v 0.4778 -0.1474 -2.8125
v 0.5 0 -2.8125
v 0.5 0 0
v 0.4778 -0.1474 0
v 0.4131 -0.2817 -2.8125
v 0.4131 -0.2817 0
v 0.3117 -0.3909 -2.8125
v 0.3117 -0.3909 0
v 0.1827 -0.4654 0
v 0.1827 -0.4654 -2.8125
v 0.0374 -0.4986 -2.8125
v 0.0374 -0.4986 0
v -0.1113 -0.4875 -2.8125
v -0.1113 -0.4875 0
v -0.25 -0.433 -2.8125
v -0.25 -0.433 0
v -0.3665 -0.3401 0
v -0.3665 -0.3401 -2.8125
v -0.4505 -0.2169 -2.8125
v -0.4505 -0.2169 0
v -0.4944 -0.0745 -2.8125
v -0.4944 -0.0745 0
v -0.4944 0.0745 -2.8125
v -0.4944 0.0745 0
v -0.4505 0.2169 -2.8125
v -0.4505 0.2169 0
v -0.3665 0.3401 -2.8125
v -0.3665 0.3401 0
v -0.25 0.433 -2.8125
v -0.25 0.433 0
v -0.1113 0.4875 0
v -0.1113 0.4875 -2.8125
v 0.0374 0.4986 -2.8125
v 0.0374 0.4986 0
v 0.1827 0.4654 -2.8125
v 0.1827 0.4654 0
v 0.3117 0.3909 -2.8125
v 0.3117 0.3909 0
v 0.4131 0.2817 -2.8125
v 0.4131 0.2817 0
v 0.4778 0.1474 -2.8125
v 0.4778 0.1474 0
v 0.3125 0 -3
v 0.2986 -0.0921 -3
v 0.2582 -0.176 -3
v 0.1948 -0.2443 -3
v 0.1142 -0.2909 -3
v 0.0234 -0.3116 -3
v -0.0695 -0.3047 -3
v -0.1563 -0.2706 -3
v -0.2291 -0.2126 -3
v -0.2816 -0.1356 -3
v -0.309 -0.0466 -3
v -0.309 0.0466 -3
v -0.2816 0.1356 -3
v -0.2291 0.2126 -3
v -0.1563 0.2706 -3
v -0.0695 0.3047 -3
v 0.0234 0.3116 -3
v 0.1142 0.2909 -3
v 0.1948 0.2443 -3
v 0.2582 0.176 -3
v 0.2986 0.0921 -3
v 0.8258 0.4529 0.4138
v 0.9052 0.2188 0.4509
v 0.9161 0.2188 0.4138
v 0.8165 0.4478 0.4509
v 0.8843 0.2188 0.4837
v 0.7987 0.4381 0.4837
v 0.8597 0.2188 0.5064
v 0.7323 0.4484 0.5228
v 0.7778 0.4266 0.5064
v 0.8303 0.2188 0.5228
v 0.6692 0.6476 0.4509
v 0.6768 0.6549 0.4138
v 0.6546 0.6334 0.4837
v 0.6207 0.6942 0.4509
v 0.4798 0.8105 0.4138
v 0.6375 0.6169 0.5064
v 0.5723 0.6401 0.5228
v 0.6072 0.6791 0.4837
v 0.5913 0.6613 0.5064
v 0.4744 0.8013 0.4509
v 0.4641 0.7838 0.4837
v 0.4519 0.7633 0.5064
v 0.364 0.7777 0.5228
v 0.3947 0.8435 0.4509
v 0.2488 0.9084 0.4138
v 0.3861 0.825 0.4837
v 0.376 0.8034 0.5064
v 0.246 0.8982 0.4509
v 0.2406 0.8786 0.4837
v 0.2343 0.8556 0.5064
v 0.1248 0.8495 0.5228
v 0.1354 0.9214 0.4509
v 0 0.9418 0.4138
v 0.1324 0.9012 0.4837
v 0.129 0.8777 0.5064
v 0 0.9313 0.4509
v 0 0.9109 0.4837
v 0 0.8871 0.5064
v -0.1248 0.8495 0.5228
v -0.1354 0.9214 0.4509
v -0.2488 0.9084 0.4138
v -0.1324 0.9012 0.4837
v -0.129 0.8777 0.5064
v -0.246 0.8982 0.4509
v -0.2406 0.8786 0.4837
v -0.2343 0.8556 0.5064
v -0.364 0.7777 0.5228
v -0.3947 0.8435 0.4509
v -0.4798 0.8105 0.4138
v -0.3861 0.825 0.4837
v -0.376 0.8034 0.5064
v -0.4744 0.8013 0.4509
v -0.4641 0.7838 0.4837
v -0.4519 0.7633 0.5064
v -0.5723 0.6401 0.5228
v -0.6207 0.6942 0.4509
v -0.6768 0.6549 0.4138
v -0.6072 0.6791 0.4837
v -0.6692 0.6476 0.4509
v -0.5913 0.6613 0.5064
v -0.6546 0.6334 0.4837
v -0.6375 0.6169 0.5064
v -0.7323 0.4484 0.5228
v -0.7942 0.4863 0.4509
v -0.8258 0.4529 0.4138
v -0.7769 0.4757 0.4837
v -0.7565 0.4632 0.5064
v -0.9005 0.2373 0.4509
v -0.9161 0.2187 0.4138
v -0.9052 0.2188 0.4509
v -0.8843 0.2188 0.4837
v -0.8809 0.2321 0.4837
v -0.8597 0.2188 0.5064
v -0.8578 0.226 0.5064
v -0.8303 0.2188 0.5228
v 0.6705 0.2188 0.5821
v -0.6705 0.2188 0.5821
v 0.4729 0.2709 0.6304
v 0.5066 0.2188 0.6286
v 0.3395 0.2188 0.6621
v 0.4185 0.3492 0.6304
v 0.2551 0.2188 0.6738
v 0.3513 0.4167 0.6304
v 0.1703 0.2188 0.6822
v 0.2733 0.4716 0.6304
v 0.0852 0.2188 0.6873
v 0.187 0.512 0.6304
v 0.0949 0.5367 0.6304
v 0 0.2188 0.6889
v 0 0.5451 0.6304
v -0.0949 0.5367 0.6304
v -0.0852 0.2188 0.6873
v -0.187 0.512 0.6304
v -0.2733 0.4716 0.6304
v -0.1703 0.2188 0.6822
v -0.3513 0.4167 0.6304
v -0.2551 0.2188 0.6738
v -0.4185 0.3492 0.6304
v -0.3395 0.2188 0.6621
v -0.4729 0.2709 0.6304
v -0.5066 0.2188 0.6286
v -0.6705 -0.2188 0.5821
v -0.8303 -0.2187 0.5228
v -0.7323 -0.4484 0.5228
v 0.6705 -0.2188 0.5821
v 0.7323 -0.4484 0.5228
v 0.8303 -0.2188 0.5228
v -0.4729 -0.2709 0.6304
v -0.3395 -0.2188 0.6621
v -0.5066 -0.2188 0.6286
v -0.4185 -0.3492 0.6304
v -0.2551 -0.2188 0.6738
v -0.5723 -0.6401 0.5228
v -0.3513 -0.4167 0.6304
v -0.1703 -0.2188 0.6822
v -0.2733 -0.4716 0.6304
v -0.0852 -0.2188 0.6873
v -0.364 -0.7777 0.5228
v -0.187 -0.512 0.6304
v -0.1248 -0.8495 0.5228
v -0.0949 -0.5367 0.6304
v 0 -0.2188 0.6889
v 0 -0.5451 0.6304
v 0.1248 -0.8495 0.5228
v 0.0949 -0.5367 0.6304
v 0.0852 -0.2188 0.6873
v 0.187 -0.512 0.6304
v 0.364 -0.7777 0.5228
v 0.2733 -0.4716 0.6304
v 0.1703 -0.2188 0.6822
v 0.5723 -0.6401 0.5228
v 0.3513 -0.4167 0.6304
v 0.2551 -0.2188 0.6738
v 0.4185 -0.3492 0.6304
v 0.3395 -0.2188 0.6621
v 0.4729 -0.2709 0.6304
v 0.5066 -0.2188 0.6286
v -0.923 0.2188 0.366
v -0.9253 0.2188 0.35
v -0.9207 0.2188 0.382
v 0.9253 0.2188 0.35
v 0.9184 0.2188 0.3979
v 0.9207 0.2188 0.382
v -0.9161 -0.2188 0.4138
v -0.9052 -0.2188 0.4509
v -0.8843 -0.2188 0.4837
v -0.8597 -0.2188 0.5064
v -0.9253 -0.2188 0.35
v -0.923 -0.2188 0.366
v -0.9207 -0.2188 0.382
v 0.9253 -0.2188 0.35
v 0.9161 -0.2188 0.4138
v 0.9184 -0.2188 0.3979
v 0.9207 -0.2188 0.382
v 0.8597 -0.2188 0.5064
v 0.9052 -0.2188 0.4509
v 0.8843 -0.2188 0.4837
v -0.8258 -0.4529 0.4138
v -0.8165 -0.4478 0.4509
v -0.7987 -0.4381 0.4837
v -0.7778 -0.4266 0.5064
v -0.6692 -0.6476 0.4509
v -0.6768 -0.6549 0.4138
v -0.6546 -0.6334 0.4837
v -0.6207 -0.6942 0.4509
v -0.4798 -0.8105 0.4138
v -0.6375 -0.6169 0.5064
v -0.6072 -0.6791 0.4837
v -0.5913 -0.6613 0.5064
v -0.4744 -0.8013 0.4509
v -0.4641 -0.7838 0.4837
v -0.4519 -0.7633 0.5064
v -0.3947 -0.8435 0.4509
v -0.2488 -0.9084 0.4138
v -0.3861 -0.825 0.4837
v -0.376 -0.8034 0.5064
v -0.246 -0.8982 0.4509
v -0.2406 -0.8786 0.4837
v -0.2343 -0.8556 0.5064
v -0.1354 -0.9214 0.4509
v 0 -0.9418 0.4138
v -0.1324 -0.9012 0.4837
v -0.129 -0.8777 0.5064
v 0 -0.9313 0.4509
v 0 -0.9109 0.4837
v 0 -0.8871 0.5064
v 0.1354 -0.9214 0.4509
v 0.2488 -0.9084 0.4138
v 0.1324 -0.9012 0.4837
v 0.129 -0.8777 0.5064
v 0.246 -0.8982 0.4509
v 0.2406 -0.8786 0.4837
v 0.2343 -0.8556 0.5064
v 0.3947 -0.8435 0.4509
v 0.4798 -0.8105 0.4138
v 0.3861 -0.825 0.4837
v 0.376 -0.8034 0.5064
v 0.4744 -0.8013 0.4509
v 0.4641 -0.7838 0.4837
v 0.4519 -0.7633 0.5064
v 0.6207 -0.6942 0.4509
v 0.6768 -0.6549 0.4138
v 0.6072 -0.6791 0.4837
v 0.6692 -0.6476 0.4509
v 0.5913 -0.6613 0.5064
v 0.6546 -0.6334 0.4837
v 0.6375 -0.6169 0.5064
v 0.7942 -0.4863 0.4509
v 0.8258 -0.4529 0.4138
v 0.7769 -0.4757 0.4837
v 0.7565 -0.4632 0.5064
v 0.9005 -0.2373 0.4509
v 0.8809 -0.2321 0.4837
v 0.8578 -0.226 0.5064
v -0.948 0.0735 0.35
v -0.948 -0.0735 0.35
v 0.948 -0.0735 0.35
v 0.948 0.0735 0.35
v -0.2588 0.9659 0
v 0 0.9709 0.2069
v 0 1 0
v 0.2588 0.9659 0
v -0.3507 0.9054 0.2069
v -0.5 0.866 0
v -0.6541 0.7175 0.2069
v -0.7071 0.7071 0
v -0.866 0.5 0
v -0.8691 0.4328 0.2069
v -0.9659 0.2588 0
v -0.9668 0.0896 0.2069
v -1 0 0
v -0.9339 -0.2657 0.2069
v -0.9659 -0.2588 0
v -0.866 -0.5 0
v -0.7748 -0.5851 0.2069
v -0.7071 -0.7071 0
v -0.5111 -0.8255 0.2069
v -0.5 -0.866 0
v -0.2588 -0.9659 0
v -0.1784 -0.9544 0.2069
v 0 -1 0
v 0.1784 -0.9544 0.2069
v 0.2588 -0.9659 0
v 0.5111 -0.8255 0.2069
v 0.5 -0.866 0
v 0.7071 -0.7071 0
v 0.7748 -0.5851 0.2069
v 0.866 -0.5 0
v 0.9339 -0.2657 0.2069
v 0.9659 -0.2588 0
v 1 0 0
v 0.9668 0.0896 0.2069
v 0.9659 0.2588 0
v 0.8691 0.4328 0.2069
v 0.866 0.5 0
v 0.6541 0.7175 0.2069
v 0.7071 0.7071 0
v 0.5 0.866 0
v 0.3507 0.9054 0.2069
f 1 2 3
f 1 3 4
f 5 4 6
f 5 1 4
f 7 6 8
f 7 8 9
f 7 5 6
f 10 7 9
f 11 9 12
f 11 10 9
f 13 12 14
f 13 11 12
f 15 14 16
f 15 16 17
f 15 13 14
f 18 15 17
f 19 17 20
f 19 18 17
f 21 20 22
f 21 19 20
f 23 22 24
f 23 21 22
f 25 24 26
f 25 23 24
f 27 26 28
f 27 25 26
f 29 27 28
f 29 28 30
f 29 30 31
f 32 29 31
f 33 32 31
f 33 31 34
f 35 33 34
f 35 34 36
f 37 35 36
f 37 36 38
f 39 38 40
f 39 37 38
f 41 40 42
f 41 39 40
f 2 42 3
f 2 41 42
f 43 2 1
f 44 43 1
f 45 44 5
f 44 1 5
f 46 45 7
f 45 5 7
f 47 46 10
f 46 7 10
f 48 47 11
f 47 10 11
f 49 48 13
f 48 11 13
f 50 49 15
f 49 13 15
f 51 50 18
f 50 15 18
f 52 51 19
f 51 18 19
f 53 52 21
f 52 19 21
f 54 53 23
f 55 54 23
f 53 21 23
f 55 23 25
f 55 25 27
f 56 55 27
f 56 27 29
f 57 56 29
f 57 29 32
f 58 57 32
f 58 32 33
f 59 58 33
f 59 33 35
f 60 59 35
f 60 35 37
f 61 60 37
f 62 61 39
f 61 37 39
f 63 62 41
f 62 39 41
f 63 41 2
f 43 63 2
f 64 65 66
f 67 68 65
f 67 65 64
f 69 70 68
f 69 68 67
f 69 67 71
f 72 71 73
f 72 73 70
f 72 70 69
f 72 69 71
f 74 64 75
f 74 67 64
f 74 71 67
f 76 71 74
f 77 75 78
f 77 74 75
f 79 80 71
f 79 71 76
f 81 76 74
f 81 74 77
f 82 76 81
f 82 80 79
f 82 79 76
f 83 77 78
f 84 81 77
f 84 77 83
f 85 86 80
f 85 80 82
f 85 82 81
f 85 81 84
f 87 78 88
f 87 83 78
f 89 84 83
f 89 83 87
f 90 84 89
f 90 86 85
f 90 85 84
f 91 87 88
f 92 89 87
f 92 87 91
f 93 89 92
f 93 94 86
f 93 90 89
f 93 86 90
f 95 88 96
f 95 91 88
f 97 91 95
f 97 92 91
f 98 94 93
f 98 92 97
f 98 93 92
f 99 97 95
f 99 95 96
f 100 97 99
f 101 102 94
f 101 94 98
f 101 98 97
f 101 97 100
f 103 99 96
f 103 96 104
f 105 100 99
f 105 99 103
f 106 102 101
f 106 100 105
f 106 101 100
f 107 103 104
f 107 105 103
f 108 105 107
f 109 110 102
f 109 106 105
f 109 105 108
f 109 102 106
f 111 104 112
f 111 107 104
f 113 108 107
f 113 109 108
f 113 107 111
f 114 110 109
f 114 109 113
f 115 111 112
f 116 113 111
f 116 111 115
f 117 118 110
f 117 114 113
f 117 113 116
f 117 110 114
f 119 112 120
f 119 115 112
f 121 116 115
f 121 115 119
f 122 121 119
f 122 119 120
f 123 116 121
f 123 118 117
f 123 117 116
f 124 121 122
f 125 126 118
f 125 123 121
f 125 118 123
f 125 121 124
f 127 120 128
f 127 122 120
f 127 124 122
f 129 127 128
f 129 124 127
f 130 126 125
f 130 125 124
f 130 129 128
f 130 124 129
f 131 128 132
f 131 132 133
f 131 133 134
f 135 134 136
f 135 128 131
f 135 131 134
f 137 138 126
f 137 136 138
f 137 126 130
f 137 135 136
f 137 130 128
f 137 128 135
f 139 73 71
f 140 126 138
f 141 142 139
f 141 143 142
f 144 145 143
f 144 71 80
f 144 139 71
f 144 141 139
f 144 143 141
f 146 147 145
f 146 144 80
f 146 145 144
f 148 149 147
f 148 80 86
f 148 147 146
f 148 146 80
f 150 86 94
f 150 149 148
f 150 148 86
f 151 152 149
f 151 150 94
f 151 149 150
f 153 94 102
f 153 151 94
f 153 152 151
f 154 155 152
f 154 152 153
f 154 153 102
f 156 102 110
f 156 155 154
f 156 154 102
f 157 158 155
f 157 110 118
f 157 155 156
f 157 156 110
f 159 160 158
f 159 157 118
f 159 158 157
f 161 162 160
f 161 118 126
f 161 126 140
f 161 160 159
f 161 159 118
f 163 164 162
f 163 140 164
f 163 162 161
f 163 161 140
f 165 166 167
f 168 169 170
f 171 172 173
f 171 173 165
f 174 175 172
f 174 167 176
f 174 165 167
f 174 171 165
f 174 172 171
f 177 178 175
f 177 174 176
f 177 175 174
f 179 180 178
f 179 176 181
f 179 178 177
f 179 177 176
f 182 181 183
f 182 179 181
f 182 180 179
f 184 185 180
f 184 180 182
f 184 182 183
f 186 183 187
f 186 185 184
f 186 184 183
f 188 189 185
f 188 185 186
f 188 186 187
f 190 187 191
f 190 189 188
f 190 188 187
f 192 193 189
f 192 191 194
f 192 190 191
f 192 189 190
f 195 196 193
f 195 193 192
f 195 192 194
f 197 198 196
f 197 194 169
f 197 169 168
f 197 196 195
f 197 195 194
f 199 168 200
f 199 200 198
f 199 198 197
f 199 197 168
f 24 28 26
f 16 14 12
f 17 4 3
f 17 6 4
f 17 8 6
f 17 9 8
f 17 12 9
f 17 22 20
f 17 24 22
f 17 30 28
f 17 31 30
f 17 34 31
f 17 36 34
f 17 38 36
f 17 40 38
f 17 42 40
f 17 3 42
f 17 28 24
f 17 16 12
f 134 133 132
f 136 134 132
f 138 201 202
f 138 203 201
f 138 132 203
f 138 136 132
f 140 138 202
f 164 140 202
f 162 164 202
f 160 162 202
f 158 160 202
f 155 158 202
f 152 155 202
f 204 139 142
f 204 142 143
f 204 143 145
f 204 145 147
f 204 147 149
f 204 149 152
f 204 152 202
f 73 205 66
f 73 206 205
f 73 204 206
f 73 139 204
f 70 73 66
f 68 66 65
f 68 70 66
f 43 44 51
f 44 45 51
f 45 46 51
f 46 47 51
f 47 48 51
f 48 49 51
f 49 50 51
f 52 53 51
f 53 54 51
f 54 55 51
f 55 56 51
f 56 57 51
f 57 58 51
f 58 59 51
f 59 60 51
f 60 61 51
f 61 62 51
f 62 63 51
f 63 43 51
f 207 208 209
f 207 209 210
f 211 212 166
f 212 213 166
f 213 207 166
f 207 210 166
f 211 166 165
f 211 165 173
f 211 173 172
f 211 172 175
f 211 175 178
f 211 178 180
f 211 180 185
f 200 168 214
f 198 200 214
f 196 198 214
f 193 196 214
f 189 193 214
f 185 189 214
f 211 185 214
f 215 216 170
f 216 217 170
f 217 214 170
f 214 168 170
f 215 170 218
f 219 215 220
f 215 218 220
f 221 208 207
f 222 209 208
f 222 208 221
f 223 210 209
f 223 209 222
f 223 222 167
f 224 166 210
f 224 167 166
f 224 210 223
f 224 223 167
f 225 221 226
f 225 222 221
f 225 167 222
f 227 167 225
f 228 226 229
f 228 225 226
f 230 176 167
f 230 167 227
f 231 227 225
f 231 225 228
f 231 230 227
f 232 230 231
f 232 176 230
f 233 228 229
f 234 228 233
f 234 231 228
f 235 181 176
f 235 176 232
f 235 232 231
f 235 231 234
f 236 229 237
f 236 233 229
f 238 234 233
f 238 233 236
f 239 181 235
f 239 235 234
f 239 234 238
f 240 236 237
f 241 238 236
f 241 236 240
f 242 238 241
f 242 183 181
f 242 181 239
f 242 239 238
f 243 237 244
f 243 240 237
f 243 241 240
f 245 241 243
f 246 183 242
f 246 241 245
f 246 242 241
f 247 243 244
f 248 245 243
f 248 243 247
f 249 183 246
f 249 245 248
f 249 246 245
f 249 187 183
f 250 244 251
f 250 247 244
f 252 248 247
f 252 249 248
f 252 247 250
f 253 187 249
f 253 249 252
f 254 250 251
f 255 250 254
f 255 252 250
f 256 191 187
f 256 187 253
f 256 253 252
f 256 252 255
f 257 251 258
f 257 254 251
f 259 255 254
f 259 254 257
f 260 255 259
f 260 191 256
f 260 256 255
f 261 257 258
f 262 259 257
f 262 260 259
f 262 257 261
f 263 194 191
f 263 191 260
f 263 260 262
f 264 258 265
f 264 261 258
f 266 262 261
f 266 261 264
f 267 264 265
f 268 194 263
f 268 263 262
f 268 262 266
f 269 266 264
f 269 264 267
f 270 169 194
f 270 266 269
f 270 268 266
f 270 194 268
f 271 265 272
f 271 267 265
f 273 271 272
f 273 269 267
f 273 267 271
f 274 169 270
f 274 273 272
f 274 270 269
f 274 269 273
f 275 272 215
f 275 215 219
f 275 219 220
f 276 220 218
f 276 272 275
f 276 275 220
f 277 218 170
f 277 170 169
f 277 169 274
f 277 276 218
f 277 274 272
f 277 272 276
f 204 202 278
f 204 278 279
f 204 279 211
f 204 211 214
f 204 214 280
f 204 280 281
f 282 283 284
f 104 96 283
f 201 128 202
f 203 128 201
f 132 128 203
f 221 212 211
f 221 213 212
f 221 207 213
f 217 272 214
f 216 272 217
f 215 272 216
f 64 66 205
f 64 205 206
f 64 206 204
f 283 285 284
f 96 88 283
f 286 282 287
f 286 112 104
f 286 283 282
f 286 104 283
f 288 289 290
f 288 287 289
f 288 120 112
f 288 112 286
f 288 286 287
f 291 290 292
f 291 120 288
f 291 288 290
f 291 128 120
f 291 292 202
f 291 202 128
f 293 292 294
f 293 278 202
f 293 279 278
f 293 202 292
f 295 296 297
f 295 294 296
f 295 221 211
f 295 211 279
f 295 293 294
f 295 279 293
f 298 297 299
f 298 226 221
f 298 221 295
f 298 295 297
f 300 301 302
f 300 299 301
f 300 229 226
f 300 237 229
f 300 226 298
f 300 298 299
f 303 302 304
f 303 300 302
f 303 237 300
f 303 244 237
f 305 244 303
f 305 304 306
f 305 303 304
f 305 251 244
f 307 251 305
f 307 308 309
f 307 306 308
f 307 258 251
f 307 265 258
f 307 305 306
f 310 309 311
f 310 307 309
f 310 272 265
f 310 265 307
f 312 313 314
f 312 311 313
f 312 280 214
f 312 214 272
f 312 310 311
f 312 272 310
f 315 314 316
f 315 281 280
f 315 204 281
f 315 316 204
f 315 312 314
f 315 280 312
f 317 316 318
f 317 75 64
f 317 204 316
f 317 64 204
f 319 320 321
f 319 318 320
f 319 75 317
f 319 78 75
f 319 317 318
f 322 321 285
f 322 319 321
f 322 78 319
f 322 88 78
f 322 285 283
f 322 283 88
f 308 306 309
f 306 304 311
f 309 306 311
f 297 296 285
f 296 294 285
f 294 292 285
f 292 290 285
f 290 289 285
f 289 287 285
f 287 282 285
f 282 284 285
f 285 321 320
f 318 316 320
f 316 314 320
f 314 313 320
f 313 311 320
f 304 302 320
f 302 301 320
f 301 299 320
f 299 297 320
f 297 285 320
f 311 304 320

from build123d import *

# Parameters (mm, degrees)
SKETCH1_R       = 1
EXTRUDE3_DEPTH  = 0.7
SKETCH4_W       = 3
SKETCH4_H       = 0.5
CHAMFER2_SIZE   = 0.1875
SKETCH32_W      = 2
SKETCH32_H      = 0.4375
EXTRUDE16_DEPTH = 0.35


with BuildPart() as part:
    # Sketch1 → Extrude3 (new body)
    with BuildSketch(Plane.XY):
        Circle(SKETCH1_R)
    extrude(amount=EXTRUDE3_DEPTH)

    # Sketch11 → Cut-Revolve3 (revolve, cut)
    with BuildSketch(Plane(origin=(0, 0, 0), x_dir=(0, 0, -1), z_dir=(1, 0, 0))):
        with BuildLine():
            Line((-0.954, 1.04), (0, 1.04))
            Line((0, 1.04), (0, 1))
            Line((0, 1), (-0.413759684, 0.941849869))
            ThreePointArc((-0.413759684, 0.941849869), (-0.479195277, 0.91451653), (-0.522842313, 0.858624987))
            ThreePointArc((-0.522842313, 0.858624987), (-0.655248992, 0.438355368), (-0.7, 0))
            Line((-0.7, 0), (-0.954, 0))
            Line((-0.954, 0), (-0.954, 1.04))
        make_face()
    revolve(axis=Axis((0, 0, 0), (0, 0, 1)), mode=Mode.SUBTRACT)

    # Sketch32 → Extrude16 (cut)
    with BuildSketch(Plane.XY.offset(0.7)):
        Rectangle(SKETCH32_W, SKETCH32_H)
    extrude(amount=-EXTRUDE16_DEPTH, mode=Mode.SUBTRACT)


with BuildPart() as body_2:
    # Sketch4 → Revolve1 (revolve)
    with BuildSketch(Plane(origin=(0, 0, 0), x_dir=(0, 0, -1), z_dir=(1, 0, 0))):
        with Locations((1.5, 0.25)):
            Rectangle(SKETCH4_W, SKETCH4_H)
    revolve(axis=Axis((0, 0, 0), (0, 0, -1)))

    # Chamfer2
    chamfer2_edges = [body_2.edges().sort_by_distance(p)[0] for p in [
        (0, -0.5, -3),
    ]]
    chamfer(chamfer2_edges, length=CHAMFER2_SIZE)


solid = Compound([part.part, body_2.part])
